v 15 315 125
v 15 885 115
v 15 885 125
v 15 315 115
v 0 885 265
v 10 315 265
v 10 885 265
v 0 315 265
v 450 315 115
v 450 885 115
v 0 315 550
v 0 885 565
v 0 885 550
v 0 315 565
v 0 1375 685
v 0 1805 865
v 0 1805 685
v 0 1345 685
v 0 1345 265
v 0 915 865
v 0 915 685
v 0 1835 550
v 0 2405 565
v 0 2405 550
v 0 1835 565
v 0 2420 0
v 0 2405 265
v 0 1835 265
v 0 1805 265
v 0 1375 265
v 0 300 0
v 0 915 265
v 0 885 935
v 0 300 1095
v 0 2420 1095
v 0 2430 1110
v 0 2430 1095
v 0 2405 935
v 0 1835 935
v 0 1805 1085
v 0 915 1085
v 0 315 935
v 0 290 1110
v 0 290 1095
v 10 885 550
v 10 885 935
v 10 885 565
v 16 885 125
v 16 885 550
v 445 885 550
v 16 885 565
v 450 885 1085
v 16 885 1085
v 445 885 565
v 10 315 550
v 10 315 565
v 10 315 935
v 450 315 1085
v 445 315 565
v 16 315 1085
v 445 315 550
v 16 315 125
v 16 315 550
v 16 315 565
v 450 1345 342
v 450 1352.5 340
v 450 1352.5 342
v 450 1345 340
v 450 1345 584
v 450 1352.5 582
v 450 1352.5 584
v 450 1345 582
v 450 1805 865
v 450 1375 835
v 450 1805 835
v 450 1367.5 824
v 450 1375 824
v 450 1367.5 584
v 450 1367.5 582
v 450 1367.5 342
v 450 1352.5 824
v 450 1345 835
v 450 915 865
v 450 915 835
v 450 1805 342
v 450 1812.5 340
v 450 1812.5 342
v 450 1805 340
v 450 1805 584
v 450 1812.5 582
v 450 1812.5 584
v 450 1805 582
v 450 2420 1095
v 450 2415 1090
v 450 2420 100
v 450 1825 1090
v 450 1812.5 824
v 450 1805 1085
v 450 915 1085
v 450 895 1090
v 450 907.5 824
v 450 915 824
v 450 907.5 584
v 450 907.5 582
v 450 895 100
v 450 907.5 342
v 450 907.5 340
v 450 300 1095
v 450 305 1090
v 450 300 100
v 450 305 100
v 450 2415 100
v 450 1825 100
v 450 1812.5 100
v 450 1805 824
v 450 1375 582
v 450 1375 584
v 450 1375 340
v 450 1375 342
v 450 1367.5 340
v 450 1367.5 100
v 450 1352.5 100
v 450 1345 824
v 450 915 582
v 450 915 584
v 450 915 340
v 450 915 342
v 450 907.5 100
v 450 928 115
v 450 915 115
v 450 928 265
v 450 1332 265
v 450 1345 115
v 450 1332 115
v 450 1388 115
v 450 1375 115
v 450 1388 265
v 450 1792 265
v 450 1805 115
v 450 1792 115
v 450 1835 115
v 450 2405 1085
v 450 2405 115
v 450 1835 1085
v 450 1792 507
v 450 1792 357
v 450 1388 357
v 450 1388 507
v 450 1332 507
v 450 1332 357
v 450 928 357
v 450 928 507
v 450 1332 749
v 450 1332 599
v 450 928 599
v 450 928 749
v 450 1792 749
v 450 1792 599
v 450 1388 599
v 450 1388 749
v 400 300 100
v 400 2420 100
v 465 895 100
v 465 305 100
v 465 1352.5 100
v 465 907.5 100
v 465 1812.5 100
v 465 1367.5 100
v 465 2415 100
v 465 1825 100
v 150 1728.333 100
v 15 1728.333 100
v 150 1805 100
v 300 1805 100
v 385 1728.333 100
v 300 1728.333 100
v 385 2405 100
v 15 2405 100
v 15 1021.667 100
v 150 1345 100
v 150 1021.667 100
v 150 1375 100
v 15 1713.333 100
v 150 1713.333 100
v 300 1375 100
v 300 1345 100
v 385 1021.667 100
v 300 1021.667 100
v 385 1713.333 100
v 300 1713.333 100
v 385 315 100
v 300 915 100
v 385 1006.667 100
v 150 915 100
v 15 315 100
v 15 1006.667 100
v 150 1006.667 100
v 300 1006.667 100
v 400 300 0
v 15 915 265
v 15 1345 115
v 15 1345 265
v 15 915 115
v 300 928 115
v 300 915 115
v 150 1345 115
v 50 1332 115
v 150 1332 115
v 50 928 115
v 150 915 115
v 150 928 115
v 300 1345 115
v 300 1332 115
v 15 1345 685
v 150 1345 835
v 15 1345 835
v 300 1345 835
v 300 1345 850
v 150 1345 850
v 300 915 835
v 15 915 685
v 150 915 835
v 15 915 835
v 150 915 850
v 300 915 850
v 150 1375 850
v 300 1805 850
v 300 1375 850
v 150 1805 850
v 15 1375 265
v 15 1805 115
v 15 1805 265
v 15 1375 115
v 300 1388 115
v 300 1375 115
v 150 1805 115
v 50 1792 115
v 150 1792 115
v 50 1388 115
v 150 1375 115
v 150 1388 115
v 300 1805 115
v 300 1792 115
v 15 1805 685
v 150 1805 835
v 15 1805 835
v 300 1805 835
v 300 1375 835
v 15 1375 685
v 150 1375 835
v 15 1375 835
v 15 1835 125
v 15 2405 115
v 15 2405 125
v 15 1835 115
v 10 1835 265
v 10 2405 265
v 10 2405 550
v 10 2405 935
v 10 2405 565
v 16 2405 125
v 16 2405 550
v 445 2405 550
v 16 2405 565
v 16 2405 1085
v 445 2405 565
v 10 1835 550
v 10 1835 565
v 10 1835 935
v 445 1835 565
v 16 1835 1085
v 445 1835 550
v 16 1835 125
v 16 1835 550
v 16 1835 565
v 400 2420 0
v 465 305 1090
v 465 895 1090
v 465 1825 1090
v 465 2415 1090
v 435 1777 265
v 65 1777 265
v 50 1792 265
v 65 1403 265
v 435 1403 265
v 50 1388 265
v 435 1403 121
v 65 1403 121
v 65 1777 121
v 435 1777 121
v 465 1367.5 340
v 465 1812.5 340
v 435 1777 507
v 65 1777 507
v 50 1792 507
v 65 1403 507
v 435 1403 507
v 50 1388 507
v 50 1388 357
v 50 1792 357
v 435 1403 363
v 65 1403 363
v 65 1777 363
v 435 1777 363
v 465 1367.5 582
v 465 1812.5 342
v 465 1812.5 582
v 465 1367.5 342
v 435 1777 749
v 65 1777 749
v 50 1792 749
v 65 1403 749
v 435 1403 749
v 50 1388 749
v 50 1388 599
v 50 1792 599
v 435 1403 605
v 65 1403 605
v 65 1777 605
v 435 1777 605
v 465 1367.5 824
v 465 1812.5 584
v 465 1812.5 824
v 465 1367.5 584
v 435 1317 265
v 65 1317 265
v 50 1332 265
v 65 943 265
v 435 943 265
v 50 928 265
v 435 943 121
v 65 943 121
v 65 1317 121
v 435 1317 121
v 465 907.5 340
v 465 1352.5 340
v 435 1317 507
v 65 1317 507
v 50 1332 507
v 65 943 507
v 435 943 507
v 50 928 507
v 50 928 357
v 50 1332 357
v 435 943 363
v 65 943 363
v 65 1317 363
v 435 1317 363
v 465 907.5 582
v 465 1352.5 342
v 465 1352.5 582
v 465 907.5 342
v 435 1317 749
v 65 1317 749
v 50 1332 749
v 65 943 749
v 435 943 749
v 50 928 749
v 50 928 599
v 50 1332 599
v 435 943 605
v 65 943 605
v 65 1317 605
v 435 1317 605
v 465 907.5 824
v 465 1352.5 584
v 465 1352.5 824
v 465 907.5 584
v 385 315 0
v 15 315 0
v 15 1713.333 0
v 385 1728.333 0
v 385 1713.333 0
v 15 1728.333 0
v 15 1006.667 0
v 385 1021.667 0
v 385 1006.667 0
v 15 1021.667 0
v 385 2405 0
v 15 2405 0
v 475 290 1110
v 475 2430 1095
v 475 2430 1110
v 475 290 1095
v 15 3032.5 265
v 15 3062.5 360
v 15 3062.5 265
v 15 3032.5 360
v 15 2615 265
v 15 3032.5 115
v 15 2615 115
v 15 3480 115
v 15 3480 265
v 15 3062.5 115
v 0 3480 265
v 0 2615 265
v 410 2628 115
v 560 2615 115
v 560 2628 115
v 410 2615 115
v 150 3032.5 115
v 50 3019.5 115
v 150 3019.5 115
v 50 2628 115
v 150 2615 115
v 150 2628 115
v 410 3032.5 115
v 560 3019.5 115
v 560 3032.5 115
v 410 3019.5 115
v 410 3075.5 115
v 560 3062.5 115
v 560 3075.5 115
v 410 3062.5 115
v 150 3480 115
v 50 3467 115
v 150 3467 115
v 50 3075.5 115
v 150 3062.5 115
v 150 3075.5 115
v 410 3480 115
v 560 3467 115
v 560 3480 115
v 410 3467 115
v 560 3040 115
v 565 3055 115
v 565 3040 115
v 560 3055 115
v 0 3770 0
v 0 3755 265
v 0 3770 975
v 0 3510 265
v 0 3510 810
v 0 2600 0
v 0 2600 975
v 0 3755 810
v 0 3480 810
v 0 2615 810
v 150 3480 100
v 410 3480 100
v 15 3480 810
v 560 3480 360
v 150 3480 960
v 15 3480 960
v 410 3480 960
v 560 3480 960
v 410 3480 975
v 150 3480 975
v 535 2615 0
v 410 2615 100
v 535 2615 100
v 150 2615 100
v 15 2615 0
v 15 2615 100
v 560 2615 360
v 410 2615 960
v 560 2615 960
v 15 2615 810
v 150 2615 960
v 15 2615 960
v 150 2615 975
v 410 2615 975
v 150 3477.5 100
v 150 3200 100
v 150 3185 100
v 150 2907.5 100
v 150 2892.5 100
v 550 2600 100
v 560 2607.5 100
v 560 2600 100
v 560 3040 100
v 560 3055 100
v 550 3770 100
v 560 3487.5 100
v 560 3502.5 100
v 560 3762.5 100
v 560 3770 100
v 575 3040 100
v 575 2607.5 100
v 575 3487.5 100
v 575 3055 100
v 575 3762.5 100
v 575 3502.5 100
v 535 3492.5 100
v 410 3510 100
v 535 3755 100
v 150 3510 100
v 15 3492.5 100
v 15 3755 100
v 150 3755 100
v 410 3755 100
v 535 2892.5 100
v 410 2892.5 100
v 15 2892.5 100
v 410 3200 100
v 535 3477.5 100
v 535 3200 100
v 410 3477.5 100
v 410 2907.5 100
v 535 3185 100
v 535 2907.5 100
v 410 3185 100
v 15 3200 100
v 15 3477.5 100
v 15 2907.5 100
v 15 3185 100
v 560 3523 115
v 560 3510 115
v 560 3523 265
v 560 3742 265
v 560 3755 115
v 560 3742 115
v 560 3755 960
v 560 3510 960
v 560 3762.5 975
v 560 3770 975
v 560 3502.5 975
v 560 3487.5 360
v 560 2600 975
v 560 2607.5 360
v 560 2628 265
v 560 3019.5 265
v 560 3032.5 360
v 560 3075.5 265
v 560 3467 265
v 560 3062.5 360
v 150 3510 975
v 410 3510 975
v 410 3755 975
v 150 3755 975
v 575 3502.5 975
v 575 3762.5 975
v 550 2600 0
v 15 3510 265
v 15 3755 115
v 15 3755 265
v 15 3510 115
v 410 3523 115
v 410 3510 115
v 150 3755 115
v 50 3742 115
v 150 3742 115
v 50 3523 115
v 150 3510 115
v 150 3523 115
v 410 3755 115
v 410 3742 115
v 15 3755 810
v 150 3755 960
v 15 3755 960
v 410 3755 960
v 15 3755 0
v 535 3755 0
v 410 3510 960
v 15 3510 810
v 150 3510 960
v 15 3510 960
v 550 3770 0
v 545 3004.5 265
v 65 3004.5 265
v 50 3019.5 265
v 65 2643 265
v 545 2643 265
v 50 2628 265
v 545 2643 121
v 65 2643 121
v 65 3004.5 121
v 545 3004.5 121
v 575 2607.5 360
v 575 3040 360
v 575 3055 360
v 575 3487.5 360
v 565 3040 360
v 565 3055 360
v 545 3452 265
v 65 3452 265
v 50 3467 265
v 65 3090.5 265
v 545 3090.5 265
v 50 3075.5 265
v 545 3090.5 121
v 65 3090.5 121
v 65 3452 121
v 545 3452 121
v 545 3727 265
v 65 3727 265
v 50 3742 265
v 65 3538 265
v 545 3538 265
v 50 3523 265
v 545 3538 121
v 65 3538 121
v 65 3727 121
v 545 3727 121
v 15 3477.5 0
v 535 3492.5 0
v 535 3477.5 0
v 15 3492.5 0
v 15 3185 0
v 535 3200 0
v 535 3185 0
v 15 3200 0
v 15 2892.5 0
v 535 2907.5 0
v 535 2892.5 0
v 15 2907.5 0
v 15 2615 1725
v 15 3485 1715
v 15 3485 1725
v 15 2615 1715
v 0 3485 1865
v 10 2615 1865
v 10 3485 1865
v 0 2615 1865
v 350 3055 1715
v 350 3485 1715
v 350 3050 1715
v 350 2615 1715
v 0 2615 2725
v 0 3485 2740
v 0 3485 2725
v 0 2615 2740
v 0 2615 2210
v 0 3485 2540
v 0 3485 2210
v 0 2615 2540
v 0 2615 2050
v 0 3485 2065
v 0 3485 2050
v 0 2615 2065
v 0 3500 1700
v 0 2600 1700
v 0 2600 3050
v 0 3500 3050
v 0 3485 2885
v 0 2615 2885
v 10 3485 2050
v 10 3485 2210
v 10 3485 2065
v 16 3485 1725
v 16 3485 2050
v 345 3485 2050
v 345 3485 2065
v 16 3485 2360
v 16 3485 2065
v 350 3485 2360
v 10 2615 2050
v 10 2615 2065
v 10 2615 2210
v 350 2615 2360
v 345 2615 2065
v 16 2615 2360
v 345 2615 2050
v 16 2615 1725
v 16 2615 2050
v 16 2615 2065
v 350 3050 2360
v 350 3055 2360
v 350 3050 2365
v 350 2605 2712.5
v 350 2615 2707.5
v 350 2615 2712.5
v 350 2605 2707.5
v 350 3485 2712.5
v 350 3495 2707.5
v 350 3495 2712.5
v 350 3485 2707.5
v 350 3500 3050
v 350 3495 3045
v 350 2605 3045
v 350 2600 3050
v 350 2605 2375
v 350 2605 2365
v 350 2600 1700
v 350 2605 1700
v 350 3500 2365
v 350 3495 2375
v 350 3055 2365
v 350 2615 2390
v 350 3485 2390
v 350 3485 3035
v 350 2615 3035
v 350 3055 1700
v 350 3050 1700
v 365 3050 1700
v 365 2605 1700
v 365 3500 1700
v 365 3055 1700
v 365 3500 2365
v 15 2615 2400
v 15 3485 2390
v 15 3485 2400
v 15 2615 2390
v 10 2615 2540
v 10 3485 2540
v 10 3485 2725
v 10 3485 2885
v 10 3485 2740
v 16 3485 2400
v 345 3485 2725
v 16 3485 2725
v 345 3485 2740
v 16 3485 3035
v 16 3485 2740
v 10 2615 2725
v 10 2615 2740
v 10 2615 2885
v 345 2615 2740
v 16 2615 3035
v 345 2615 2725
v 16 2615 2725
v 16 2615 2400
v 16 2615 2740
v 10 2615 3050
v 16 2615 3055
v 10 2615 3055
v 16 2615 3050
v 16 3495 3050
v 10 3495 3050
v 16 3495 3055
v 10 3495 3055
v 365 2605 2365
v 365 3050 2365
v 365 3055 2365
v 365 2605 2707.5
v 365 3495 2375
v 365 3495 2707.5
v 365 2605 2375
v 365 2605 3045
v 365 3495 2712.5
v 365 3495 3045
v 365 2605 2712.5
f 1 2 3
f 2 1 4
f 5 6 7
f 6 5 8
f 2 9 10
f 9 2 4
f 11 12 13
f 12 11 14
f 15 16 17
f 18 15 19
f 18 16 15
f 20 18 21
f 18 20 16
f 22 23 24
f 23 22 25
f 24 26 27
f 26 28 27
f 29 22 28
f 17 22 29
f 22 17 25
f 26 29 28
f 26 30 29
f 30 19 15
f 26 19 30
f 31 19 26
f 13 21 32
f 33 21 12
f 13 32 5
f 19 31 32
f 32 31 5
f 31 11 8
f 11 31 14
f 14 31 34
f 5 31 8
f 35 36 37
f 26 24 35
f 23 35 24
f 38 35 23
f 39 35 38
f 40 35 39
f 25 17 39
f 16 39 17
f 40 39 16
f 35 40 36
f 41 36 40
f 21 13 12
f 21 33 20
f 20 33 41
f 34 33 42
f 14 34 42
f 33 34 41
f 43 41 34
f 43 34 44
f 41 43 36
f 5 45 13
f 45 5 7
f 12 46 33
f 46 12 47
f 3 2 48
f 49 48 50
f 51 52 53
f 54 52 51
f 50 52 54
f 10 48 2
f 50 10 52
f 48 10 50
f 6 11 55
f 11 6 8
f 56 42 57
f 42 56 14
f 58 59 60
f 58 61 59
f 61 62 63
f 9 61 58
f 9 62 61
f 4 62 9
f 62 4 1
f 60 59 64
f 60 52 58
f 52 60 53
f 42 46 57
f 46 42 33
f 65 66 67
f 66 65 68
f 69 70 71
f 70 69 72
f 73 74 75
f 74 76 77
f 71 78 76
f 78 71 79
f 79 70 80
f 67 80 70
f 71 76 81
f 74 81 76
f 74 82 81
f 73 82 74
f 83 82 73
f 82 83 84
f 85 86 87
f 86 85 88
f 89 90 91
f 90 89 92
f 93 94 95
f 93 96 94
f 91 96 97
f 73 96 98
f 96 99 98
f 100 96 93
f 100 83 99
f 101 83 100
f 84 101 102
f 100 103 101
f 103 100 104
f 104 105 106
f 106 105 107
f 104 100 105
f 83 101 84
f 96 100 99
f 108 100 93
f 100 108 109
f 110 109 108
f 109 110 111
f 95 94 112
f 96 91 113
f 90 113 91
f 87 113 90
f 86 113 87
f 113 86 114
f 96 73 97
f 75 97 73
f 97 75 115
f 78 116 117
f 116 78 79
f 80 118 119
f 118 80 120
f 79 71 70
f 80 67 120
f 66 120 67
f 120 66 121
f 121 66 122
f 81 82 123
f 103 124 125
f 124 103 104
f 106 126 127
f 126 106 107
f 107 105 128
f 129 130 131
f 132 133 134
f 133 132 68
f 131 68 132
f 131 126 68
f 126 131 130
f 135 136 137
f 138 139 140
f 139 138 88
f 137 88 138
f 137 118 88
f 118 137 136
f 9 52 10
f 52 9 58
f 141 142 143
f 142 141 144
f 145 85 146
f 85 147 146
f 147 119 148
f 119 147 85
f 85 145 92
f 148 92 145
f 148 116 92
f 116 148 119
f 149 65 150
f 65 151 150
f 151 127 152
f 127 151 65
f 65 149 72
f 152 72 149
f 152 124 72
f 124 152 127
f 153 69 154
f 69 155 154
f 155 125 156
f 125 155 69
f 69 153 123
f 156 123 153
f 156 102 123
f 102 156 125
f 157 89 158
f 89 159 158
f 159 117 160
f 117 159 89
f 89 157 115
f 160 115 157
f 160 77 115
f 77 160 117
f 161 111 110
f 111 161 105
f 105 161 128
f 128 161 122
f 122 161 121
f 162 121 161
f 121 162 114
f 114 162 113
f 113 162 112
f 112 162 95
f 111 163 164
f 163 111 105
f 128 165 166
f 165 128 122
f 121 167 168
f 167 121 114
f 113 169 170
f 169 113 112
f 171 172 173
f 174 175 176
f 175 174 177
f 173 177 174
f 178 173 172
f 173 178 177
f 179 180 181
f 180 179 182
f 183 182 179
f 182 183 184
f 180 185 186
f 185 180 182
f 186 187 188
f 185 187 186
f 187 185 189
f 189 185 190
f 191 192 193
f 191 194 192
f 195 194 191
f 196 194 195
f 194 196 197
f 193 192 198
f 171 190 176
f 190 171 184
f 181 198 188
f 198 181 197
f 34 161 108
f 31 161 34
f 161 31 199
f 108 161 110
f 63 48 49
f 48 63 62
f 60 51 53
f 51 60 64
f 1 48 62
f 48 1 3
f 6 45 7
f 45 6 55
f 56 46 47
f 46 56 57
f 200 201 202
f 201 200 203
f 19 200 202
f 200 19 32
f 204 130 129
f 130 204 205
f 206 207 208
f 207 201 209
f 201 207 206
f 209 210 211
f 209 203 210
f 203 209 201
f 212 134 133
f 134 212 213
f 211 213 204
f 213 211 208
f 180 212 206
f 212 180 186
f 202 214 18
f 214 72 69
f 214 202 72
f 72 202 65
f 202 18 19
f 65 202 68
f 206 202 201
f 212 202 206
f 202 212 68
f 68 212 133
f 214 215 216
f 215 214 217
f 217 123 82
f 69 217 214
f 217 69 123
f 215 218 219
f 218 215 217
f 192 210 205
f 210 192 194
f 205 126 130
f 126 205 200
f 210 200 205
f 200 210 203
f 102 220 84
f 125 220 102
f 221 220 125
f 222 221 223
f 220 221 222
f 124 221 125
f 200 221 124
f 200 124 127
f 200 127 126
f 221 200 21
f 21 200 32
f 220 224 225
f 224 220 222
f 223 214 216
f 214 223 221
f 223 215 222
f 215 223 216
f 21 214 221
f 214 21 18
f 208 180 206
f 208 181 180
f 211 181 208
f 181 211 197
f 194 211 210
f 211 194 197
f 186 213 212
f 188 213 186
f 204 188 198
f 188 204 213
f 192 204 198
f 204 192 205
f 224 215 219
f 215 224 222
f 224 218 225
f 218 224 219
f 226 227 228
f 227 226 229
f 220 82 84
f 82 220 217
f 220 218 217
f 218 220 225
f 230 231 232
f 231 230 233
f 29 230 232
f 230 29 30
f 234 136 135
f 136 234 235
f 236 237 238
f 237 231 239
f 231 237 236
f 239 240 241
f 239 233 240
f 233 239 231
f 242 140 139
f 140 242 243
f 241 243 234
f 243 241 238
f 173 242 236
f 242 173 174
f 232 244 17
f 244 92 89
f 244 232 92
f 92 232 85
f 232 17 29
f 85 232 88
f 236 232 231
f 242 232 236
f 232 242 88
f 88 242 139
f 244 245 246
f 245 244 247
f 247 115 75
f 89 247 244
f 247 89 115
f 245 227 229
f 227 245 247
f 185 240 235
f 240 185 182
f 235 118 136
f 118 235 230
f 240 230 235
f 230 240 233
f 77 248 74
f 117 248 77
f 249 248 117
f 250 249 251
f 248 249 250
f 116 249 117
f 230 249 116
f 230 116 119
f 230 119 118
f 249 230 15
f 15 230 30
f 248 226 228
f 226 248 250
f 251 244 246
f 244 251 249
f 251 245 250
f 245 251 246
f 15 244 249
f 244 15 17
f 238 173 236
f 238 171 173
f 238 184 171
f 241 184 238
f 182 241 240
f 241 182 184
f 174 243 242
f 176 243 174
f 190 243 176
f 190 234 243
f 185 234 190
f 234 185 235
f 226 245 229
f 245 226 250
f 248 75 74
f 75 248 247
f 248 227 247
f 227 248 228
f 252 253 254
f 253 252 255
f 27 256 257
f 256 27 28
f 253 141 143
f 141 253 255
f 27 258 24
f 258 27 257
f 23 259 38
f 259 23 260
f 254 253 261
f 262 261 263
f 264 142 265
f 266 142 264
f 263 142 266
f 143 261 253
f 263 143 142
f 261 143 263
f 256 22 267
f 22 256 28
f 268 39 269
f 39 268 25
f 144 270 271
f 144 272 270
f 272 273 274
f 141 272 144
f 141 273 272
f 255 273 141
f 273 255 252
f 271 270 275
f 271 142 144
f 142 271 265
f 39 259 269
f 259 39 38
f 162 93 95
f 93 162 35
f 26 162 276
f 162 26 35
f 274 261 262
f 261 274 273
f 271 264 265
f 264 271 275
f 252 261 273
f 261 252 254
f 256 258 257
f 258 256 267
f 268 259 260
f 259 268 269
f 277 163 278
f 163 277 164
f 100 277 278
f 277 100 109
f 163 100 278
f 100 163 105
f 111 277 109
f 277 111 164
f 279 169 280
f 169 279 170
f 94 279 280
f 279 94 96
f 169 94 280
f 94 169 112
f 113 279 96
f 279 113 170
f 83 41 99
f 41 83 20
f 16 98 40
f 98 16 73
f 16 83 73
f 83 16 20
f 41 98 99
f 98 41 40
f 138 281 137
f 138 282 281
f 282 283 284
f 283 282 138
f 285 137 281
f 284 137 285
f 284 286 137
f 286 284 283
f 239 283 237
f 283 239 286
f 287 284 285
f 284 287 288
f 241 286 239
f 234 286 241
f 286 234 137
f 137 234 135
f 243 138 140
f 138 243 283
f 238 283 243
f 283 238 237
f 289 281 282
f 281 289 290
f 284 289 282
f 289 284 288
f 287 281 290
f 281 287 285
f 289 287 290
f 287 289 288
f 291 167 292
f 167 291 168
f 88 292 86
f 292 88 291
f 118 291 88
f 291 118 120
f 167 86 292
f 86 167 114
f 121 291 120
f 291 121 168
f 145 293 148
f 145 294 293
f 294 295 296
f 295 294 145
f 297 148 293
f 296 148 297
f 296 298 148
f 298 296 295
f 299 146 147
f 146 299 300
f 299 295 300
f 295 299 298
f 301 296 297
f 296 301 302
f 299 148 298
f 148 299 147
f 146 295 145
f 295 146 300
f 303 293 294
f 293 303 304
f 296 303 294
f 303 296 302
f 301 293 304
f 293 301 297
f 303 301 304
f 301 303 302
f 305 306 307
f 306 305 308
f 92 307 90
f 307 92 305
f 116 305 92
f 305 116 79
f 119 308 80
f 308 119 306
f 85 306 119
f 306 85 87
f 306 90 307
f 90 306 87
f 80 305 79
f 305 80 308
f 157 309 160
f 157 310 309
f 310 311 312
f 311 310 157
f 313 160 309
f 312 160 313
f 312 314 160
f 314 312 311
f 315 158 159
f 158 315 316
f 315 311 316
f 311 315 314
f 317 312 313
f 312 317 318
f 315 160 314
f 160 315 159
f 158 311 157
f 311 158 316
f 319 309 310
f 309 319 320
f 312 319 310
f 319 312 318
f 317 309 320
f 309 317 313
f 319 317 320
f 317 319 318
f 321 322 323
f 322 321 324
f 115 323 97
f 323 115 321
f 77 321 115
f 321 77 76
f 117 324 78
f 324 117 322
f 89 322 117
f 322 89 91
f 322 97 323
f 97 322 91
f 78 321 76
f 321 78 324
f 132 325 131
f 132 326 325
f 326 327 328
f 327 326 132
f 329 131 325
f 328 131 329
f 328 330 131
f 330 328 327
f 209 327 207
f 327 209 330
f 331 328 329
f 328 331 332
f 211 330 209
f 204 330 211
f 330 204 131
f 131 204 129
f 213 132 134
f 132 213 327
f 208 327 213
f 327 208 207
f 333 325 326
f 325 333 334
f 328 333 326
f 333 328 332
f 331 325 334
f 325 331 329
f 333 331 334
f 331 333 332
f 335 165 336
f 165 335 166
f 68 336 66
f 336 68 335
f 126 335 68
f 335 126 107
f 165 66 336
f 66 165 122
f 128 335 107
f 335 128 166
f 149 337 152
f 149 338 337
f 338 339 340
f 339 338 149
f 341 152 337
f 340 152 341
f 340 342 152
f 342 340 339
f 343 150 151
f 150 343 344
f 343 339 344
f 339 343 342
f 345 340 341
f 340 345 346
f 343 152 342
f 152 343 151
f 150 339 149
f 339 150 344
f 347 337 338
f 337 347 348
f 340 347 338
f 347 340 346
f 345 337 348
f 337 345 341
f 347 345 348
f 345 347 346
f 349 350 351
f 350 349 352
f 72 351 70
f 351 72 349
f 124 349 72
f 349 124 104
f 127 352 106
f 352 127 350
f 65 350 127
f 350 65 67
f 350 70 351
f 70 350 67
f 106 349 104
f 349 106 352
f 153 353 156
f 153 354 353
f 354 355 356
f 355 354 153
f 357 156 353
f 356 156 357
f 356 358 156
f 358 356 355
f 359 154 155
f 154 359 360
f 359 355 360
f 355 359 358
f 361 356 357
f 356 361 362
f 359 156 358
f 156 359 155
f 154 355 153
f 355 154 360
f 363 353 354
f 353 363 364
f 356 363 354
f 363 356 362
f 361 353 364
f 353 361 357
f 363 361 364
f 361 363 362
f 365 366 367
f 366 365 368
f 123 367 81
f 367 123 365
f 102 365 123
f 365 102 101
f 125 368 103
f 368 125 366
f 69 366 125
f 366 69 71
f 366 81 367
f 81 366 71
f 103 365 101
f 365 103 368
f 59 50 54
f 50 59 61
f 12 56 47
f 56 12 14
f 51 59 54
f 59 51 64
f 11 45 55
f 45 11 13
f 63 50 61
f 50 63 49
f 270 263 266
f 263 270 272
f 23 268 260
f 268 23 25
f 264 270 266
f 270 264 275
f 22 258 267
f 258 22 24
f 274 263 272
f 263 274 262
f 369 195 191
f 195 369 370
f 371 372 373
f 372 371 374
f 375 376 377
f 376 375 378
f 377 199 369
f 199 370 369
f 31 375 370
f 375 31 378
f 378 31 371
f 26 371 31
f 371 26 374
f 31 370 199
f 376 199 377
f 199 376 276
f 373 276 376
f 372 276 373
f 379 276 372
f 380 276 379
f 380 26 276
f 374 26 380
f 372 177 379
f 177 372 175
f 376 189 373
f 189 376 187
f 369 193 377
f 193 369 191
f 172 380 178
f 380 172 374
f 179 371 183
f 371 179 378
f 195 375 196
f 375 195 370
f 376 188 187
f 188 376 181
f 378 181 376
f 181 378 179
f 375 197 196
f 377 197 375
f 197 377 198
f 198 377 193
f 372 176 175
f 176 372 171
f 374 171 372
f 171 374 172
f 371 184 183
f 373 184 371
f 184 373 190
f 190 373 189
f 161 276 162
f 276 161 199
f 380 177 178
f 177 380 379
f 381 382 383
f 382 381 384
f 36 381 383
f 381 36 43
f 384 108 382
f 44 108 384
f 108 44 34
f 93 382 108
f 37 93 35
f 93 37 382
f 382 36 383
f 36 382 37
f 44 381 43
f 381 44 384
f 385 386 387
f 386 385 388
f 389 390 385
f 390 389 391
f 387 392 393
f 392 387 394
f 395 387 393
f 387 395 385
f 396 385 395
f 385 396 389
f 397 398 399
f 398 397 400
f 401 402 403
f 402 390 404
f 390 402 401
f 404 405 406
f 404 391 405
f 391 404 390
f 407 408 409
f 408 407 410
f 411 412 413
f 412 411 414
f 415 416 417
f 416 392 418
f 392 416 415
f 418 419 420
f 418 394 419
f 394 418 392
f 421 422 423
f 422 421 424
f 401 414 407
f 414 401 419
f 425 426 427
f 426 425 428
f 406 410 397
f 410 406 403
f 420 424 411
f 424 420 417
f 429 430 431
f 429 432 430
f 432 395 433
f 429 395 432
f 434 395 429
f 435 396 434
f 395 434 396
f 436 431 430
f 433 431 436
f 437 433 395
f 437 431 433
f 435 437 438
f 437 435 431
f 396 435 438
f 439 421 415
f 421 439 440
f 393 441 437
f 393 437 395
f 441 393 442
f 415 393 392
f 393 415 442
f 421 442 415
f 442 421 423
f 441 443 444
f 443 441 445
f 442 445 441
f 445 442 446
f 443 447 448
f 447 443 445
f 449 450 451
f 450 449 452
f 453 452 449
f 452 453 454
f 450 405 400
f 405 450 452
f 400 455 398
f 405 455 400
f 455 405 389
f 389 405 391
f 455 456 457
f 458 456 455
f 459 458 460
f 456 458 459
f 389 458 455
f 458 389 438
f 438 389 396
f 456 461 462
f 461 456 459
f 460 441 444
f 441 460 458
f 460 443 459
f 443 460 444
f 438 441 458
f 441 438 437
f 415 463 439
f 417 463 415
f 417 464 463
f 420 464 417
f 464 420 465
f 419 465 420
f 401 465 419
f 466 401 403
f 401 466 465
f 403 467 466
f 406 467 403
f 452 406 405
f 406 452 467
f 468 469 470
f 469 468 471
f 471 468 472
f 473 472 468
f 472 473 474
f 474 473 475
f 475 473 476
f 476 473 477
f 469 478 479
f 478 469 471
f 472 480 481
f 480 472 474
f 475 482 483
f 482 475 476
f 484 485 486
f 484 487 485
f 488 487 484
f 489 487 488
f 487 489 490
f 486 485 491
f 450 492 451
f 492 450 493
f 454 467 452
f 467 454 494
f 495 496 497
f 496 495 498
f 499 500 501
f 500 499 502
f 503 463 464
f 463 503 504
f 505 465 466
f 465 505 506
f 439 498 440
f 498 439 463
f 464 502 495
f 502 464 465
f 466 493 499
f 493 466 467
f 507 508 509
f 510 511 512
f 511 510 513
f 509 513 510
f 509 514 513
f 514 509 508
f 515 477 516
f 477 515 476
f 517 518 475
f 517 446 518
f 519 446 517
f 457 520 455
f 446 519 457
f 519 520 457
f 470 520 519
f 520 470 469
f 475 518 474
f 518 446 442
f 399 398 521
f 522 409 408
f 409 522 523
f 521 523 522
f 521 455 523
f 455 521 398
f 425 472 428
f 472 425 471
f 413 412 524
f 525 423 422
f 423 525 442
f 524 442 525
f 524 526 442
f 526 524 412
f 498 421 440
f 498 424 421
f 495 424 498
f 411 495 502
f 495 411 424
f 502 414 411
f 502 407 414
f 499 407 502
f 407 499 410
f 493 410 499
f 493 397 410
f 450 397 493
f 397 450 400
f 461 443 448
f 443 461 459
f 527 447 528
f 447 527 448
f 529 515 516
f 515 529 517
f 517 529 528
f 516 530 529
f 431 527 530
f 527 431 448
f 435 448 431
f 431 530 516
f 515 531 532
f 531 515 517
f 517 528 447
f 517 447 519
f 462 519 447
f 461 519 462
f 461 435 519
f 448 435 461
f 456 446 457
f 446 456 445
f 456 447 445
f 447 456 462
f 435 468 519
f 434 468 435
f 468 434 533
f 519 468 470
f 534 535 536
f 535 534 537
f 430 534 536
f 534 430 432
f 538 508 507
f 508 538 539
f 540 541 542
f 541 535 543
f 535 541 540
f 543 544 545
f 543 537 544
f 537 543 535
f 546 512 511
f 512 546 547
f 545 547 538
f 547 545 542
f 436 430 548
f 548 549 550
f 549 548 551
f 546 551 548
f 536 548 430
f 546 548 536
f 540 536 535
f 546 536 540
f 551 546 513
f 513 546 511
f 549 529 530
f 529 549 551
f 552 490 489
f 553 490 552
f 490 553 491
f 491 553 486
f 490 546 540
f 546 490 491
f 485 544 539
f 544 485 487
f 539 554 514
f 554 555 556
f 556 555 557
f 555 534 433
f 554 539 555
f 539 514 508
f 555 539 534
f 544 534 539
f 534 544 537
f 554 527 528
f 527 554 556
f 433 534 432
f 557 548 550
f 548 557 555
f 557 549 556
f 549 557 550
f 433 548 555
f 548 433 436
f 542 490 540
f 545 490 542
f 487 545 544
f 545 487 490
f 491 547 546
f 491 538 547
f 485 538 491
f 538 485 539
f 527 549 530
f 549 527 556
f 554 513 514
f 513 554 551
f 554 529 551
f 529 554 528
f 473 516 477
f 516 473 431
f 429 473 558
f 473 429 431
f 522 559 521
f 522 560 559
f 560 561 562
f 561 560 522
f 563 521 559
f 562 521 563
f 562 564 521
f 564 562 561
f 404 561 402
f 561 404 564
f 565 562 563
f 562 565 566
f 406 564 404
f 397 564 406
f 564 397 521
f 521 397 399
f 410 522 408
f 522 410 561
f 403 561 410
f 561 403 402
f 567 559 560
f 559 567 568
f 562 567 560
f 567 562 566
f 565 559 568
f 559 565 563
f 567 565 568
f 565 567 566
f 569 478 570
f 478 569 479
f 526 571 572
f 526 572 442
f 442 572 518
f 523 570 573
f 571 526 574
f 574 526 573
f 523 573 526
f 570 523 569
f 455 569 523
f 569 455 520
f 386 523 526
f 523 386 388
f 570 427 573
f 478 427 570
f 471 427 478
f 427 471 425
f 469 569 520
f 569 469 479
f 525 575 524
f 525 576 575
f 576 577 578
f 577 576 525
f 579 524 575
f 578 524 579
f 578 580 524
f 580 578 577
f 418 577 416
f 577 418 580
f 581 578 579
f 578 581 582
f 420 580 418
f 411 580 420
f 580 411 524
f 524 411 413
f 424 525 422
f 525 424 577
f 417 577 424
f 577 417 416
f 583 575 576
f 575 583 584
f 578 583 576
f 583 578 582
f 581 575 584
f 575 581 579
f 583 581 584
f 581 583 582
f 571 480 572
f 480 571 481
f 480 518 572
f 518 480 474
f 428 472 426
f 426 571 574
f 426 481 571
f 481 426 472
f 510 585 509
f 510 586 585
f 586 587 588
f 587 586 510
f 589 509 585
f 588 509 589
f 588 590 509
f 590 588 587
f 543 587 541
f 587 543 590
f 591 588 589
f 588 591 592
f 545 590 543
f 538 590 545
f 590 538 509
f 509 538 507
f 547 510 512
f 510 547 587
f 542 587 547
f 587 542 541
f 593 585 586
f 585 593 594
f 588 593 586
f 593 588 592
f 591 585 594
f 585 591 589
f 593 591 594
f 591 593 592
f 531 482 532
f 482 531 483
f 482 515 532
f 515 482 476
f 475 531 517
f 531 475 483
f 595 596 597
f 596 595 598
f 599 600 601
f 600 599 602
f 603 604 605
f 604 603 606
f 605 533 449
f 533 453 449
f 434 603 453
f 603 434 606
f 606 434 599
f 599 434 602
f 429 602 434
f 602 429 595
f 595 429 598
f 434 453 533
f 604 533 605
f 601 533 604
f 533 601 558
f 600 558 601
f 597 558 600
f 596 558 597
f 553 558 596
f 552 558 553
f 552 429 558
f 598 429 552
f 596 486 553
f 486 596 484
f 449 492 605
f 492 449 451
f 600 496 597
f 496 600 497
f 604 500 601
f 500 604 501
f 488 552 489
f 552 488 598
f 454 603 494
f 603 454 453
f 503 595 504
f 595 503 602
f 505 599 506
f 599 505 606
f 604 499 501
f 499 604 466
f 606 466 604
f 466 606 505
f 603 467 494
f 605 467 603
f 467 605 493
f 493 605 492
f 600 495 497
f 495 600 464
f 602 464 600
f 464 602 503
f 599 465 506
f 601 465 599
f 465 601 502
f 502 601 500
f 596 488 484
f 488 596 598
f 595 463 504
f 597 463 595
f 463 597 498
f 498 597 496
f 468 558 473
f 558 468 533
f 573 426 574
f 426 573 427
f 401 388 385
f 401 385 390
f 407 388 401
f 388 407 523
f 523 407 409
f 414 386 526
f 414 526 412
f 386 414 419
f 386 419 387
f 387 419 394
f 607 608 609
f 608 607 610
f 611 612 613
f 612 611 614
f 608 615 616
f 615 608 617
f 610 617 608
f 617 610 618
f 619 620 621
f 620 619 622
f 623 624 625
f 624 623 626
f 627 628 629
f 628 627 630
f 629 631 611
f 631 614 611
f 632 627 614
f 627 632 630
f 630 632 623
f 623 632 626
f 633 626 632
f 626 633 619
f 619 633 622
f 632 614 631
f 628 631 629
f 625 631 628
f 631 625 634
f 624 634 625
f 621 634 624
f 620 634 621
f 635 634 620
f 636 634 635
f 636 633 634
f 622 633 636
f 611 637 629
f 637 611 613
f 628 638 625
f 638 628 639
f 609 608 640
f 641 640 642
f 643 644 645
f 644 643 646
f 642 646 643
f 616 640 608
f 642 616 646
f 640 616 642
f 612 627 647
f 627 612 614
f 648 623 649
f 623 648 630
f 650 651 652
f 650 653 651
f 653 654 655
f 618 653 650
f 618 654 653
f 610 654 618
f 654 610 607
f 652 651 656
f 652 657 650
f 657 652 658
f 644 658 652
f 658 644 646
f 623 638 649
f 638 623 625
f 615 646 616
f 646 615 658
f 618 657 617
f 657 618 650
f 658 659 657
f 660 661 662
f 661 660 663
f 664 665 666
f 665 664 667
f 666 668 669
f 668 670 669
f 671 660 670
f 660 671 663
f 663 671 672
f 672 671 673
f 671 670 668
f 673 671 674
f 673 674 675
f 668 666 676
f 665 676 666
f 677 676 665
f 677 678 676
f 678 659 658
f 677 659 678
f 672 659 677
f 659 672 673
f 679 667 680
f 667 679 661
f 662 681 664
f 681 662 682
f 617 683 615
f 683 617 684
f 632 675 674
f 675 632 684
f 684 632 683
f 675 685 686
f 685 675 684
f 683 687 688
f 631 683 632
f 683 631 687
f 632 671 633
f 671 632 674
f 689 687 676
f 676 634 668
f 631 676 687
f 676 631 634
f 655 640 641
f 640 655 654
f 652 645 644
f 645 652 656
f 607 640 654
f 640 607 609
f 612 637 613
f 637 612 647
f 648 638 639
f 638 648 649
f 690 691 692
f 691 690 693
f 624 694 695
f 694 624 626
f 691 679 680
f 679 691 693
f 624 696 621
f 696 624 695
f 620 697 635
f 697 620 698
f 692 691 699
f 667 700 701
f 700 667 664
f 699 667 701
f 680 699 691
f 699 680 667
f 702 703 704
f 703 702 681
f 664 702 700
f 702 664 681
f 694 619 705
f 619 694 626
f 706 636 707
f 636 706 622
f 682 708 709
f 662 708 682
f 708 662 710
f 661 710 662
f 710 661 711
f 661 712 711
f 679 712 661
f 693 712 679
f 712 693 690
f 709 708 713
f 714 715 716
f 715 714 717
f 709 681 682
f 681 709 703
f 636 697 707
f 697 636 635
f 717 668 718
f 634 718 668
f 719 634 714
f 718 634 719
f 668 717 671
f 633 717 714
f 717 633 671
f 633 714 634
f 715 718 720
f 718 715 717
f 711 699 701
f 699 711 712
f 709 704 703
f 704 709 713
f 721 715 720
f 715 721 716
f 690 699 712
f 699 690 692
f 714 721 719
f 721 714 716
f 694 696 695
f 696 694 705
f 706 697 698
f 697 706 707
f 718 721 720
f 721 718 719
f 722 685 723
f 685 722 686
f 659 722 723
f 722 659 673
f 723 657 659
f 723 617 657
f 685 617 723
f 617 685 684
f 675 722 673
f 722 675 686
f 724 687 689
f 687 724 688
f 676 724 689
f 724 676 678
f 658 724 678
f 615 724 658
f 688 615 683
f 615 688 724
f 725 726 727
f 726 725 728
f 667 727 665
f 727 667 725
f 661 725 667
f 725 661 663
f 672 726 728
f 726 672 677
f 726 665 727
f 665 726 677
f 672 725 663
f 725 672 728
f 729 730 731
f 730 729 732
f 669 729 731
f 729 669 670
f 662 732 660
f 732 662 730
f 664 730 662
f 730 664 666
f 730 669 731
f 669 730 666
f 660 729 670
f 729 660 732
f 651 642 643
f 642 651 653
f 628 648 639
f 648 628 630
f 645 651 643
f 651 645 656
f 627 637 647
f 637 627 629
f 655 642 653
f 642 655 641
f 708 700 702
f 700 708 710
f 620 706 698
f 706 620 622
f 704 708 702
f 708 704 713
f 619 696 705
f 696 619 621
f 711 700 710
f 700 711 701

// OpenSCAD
use <cajoneriaLibV1.scad>
/////////////////////////////////////
espesor = 15; riel = 13;
socalo = 100;
espacioFrizer = 900;
// modulo(i) = [
//    ancho, alto, profundidad,
//    refuerzo, esqueleto, fondo, espesor,
//    color, [x,y+sum(modulo(i..i-1)[ancho]),z], nombre
//]

mod_00 = [600,1000,450,"No","No","Si",espesor,"white",
         [0,0,socalo], "Modulo 00"];
mod_01 = [460,750,450,"No","Si","No",espesor,"white",
         [0,mod_00[0],socalo], "Modulo 01"];
mod_02 = [460,750,450,"No","Si","No",espesor,"white",
         [0,mod_00[0]+mod_01[0],socalo], "Modulo 02"];
mod_03 = [600,1000,450,"No","No","Si",espesor,"white",
         [0,mod_00[0]+mod_01[0]+mod_02[0],socalo], "Modulo 03"];
mod_04 = [530,1000,450,"No","Si","No",espesor,"white",
         [0,mod_00[0]+mod_01[0]+mod_02[0]+mod_03[0],socalo], "Modulo 04"];


mod_90 = [895,875,560,"No","Si","No",espesor,"yellow",
         [0,0,socalo],"Modulo 90"];
mod_91 = [275,875,560,"No","Si","No",espesor,"yellow",
         [0,mod_90[0],socalo], "Modulo 91"];

// modulo alto
mod_80 = [900,675,350,"No","No","Si",espesor,"yellow",
         [0,0,0],"Modulo 90"];
mod_81 = [900,675,350,"No","No","Si",espesor,"yellow",
         [0,0,mod_80[1]], "Modulo 91"];
 


ModulosX = [mod_00, mod_01, mod_02, mod_03,
    ];
  
ModulosW =[
            mod_90, mod_91,
    ];
    
ModulosZ =[
         mod_80, mod_81
    ];    
    
// puerta = [moduloIndex, ancho, alto, cant, espesor, 
//    color, [x,y,z]], nombre
//]

puerta_00 = [0,mod_00[0]-10,mod_00[1]-10,1,espesor,"yellow",
            [mod_00[8][0]+mod_02[2],
                mod_00[8][1]+5,
                mod_00[8][2]], 
            "puerta 1"];
puerta_01 = [3,mod_03[0]-10,mod_03[1]-10,1,espesor,"yellow",
            [mod_03[8][0]+mod_03[2],
                mod_03[8][1]+5,
                mod_03[8][2]], 
            "puerta 2"];

puerta_10 = [0,mod_80[0]/2-5,mod_80[1]-10,1,espesor,"yellow",
            [mod_80[8][0]+mod_80[2],
                mod_80[8][1]+5,
                mod_80[8][2]], 
            "puerta 1"];
            
puerta_11 = [0,mod_80[0]/2-5,mod_80[1]-10,1,espesor,"yellow",
            [mod_80[8][0]+mod_80[2],
                mod_80[8][1]+5+mod_80[0]/2,
                mod_80[8][2]], 
            "puerta 1"];
            
puerta_12 = [1,mod_81[0]-10,mod_81[1]/2-5,1,espesor,"yellow",
            [mod_81[8][0]+mod_81[2],
                mod_81[8][1]+5,
                mod_81[8][2]], 
            "puerta 2"];
puerta_13 = [1,mod_81[0]-10,mod_81[1]/2-5,1,espesor,"yellow",
            [mod_81[8][0]+mod_81[2],
                mod_81[8][1]+5,
                mod_81[8][2]+mod_81[1]/2], 
            "puerta 2"];


PuertasX = [
        puerta_00, puerta_01
    ];
PuertasZ =[
        puerta_10, puerta_11,
        puerta_12, puerta_13
];


armario_00 = [2, mod_01[0]+mod_02[0], 
            250, mod_00[2],
            espesor, "yellow", (1+1),
            [0,mod_00[0],850],
            "Armario 1"];

socalo_00 = [0, 400, 2120, socalo,
            espesor, "yellow", (2+2),
            [0,0,0],
            "Socalo 1"];
socalo_01 = [0, 500, 1600, socalo,
            espesor, "yellow", (2+3),
            [0,0,0],
            "Socalo 1"];
socalo_02 = [0, 550, 1170, socalo,
            espesor, "yellow", (4+1),
            [0,0,0],
            "Socalo 1"];
socalo_03 = [0, 1600, 1800, socalo/2,
            espesor, "yellow", (2+3),
            [0,0,-500],
            "Socalo 3"];
socalo_04 = [0, 1000, 1750, socalo,
            espesor, "yellow", (2+2),
            [0,0,0],
            "Socalo 1"];
            

// cajon_00 = [moduloIndex, ancho, alto, profundidad,
//          espesor, color, frenteDec, anchoDec, altoDec, 
//          colorDec, [x,y,z]]


cajon_00 = [2, mod_02[0]-espesor*2-riel*2, 150, mod_02[2]-50,
          espesor, "white", "Si", mod_02[0]-espesor, 
          240,"yellow", 
          [mod_02[8][0]+50,
            mod_02[8][1]+espesor+riel,
            mod_02[8][2]+espesor]];
            
cajon_01 = [2, mod_02[0]-espesor*2-riel*2, 150, mod_02[2]-50,
          espesor, "white", "Si", mod_02[0]-espesor, 
          240,"yellow", 
          [mod_02[8][0]+50,
            mod_02[8][1]+espesor+riel,
            mod_02[8][2]+espesor+(240+2)*1]];
            
cajon_02 = [2, mod_02[0]-espesor*2-riel*2, 150, mod_02[2]-50,
          espesor, "white", "Si", mod_02[0]-espesor, 
          240,"yellow", 
          [mod_02[8][0]+50,
            mod_02[8][1]+espesor+riel,
            mod_02[8][2]+espesor+(240+2)*2]];


cajon_10 = [1, mod_01[0]-espesor*2-riel*2, 150, mod_01[2]-50,
          espesor, "white", "Si", mod_01[0]-espesor, 
          240,"yellow", 
          [mod_01[8][0]+50,
            mod_01[8][1]+espesor+riel,
            mod_01[8][2]+espesor]];
            
cajon_11 = [1, mod_01[0]-espesor*2-riel*2, 150, mod_01[2]-50,
          espesor, "white", "Si", mod_01[0]-espesor, 
          240,"yellow", 
          [mod_01[8][0]+50,
            mod_01[8][1]+espesor+riel,
            mod_01[8][2]+espesor+(240+2)*1]];
            
cajon_12 = [1, mod_01[0]-espesor*2-riel*2, 150, mod_01[2]-50,
          espesor, "white", "Si", mod_01[0]-espesor, 
          240,"yellow", 
          [mod_01[8][0]+50,
            mod_01[8][1]+espesor+riel,
            mod_01[8][2]+espesor+(240+2)*2]];
            
cajon_20 = [0, mod_90[0]/2-espesor*2-riel*2, 150, mod_90[2]-50,
          espesor, "white", "Si", mod_90[0]/2-espesor, 
          260,"yellow", 
          [mod_90[8][0]+50,
            mod_90[8][1]+espesor+riel,
            mod_90[8][2]+espesor]];

cajon_21 = [0, mod_90[0]/2-espesor*2-riel*2, 150, mod_90[2]-50,
          espesor, "white", "Si", mod_90[0]/2-espesor, 
          260,"yellow", 
          [mod_90[8][0]+50,
            mod_90[8][1]+espesor+riel+mod_90[0]/2,
            mod_90[8][2]+espesor]];

cajon_22 = [1, mod_91[0]-espesor*2-riel*2, 150, mod_91[2]-50,
          espesor, "white", "Si", mod_91[0]-espesor, 
          875  ,"yellow", 
          [mod_91[8][0]+50,
            mod_91[8][1]+espesor+riel,
            mod_91[8][2]+espesor]];

            
CajonesX = [
    cajon_00, cajon_01, cajon_02,
    cajon_10, cajon_11, cajon_12,
];

CajonesY = [
    cajon_20, cajon_21, cajon_22
];

div_00 = [0,mod_00[0]-10,mod_00[2]-5,1,espesor,"white",
            [mod_00[8][0],
                mod_00[8][1]+5,
                mod_00[8][2]+450], 
            "division 1"];
div_01 = [3,mod_03[0]-10,mod_03[2]-5,1,espesor,"white",
            [mod_03[8][0],
                mod_03[8][1]+5,
                mod_03[8][2]+450], 
            "division 2"];
div_02 = [0,mod_80[0]-10,mod_80[2]-5,1,espesor,"yellow",
            [mod_00[8][0],
                mod_80[8][1]+5,
                mod_80[8][2]+mod_80[2]], 
            "division 1"];
div_03 = [1,mod_81[0]-10,mod_81[2]-5,1,espesor,"yellow",
            [mod_81[8][0],
                mod_81[8][1]+5,
                mod_81[8][2]+mod_81[2]], 
            "division 2"];


Divisiones = [
            div_00, div_01
];
Divisiones2 = [
            div_02, div_03
];


translate([0,300,0])
union(){
    modulosdeCocina(ModulosX);
    puertasdeModulo(PuertasX);
    armariodeModulo(armario_00);
    cajonesdeModulo(CajonesX);
    divHorizontal(Divisiones);
    socalo(socalo_00);
    translate([0,-10,1095])
    tableroX(2120+20,450+25,15, "techo", "yellow");
}
echo("Inicio Cocina");
translate([0,2600,0])
union(){
    modulosdeCocina(ModulosW);
    cajonesdeModulo(CajonesY);
    socalo(socalo_02);
    translate([15,mod_90[0]/2-15,115])
    tableroX(550, 260-15, 15, "lateral", "yellow");
    translate([15,mod_90[0]/2,115])
    tableroX(550, 260-15, 15, "lateral", "yellow");
}
echo("Fin Cocina");
translate([0,2600,1700])
union(){
    modulosdeCocina(ModulosZ);
    puertasdeModulo(PuertasZ);
    divHorizontal(Divisiones2);
}


//translate([0,250+950,0])
//socalo(socalo_01);

module paredes(){
    translate ([-100,0,0]) color("lightslategray")
    tableroX(ancho=2730,
            alto=2900,
            espesor=100,
            posicion="fondo",
            color="red",
            parte="Pared");
    
    translate ([200,2730- 350-520,425]) color("red")
    tableroX(ancho=350,
            alto=350,
            espesor=200,
            posicion="fondo",
            color="red",
            parte="Pared");
    
//    translate ([0,4100,0]) color("lightslategray")
//    tableroX(ancho=1000,
//            alto=2900,
//            espesor=100,
//            posicion="lateral",
//            color="red",
//            parte="Pared");
//    translate ([1000,4100-180,0]) color("lightslategray")
//    tableroX(ancho=320,
//            alto=2900,
//            espesor=320,
//            posicion="lateral",
//            color="red",
//            parte="Pilar");
//    translate ([0,-100,0]) color("white")
//    tableroX(ancho=2300,
//            alto=2900,
//            espesor=100,
//            posicion="lateral",
//            color="red",
//            parte="Pared");
//    translate ([1000,870,0]) color("lightslategray")
//    tableroX(ancho=380,
//            alto=2900,
//            espesor=280,
//            posicion="lateral",
//            color="red",
//            parte="Pilar");
//    translate ([0,3250-400,0]) color("gainsboro")
//    tableroX(ancho=800,
//            alto=1880,
//            espesor=700,
//            posicion="fondo",
//            color="green",
//            parte="Frizer");                
}

//paredes();
